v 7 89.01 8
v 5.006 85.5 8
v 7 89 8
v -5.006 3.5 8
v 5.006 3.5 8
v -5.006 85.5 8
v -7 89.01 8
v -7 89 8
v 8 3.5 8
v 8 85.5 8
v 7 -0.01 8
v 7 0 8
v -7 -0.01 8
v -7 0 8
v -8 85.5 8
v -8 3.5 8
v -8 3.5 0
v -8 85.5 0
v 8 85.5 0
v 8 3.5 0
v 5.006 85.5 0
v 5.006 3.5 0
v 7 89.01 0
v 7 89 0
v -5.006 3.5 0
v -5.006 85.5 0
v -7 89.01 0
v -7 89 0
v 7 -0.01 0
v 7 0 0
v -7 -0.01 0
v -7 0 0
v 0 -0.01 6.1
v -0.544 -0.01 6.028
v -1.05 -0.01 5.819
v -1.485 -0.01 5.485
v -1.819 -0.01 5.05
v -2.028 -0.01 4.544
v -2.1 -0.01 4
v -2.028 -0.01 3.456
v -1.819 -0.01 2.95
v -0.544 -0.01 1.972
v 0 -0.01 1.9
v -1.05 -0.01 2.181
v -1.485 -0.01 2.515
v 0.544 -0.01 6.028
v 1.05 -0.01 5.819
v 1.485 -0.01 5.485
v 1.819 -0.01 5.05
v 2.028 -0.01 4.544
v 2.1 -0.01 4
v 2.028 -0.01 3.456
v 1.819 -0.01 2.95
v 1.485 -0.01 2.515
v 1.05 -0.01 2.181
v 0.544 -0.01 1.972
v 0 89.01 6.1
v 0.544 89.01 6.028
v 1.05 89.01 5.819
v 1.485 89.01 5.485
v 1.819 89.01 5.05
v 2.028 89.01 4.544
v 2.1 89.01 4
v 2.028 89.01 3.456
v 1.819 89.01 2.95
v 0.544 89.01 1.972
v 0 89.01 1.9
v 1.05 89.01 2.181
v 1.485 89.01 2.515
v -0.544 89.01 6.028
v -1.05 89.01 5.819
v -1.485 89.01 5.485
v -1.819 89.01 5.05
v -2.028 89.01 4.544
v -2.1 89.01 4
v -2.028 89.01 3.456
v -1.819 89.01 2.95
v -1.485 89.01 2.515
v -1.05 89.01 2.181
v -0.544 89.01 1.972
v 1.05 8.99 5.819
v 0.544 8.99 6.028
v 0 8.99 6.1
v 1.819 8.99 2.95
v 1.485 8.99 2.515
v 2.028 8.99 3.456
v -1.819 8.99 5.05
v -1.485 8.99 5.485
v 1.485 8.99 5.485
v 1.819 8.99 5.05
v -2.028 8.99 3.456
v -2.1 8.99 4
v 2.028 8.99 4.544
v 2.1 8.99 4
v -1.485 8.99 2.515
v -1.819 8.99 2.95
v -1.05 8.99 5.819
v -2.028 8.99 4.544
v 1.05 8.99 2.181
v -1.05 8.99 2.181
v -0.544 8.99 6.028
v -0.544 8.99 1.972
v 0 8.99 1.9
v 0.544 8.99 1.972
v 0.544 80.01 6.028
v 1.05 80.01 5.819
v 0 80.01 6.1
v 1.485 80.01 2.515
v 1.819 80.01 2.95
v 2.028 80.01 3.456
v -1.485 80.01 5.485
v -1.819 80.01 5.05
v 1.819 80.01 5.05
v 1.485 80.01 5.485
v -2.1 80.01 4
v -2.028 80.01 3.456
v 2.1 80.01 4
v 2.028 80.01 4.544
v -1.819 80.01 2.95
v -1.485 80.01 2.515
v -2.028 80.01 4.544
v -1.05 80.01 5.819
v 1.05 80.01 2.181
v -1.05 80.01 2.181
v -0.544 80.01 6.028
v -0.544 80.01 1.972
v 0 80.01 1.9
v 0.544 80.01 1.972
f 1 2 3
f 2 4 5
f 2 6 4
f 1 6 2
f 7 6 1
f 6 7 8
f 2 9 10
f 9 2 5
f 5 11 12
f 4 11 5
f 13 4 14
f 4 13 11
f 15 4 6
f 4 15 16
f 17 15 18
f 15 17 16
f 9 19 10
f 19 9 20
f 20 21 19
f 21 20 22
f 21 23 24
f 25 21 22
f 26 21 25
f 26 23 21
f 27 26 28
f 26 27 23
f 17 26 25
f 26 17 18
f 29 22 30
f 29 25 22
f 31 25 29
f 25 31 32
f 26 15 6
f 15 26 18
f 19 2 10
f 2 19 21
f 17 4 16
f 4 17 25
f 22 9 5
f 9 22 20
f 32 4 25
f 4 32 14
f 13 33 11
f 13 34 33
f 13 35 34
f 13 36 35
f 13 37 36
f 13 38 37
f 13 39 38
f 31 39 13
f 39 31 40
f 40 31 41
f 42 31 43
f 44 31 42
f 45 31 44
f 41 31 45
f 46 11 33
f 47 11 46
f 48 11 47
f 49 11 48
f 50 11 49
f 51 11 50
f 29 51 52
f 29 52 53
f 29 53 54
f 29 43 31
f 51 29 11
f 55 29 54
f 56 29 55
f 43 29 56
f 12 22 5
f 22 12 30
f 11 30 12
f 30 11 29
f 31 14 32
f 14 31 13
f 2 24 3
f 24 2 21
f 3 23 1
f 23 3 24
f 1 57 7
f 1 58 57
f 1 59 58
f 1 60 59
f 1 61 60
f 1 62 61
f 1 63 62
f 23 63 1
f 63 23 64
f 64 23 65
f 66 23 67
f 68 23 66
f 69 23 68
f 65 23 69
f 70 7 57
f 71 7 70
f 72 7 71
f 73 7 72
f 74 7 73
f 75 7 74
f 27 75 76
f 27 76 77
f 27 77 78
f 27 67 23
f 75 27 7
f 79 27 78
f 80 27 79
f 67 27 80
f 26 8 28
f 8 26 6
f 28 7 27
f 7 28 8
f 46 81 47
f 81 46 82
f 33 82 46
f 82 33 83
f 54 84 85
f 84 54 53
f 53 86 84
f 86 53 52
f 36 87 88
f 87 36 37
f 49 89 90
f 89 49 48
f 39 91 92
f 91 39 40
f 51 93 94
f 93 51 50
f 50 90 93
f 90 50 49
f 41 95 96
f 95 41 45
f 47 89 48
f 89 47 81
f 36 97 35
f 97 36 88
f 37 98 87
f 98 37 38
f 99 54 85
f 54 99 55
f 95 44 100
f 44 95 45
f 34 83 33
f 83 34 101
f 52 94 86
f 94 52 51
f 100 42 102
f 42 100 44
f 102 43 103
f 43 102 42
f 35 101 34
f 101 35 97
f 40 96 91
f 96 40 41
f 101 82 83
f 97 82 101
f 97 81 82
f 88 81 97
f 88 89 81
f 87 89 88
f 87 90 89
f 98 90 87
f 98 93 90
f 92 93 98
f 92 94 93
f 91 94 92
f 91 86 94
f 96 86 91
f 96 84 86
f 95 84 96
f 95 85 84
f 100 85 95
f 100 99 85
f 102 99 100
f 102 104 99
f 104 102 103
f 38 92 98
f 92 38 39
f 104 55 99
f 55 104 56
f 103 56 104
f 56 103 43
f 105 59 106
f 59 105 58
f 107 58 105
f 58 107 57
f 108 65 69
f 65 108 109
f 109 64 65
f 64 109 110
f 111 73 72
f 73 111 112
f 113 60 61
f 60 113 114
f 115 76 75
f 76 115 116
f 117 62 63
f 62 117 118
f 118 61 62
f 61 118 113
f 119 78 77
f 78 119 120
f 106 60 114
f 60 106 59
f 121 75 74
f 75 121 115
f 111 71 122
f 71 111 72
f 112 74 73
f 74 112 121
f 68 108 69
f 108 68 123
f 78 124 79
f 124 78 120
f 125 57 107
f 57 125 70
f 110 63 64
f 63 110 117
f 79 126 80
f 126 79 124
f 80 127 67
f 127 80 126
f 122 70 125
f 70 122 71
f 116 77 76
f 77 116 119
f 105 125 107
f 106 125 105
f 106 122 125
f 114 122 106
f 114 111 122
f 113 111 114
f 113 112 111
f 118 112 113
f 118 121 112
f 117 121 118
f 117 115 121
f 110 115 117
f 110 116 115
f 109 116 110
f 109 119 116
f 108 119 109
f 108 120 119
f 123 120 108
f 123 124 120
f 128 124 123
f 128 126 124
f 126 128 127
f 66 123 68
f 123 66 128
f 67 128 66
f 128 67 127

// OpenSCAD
include <../lib/meshtastic-drybag-node-lib.scad>;
$fn = 40;
xbar_print();
